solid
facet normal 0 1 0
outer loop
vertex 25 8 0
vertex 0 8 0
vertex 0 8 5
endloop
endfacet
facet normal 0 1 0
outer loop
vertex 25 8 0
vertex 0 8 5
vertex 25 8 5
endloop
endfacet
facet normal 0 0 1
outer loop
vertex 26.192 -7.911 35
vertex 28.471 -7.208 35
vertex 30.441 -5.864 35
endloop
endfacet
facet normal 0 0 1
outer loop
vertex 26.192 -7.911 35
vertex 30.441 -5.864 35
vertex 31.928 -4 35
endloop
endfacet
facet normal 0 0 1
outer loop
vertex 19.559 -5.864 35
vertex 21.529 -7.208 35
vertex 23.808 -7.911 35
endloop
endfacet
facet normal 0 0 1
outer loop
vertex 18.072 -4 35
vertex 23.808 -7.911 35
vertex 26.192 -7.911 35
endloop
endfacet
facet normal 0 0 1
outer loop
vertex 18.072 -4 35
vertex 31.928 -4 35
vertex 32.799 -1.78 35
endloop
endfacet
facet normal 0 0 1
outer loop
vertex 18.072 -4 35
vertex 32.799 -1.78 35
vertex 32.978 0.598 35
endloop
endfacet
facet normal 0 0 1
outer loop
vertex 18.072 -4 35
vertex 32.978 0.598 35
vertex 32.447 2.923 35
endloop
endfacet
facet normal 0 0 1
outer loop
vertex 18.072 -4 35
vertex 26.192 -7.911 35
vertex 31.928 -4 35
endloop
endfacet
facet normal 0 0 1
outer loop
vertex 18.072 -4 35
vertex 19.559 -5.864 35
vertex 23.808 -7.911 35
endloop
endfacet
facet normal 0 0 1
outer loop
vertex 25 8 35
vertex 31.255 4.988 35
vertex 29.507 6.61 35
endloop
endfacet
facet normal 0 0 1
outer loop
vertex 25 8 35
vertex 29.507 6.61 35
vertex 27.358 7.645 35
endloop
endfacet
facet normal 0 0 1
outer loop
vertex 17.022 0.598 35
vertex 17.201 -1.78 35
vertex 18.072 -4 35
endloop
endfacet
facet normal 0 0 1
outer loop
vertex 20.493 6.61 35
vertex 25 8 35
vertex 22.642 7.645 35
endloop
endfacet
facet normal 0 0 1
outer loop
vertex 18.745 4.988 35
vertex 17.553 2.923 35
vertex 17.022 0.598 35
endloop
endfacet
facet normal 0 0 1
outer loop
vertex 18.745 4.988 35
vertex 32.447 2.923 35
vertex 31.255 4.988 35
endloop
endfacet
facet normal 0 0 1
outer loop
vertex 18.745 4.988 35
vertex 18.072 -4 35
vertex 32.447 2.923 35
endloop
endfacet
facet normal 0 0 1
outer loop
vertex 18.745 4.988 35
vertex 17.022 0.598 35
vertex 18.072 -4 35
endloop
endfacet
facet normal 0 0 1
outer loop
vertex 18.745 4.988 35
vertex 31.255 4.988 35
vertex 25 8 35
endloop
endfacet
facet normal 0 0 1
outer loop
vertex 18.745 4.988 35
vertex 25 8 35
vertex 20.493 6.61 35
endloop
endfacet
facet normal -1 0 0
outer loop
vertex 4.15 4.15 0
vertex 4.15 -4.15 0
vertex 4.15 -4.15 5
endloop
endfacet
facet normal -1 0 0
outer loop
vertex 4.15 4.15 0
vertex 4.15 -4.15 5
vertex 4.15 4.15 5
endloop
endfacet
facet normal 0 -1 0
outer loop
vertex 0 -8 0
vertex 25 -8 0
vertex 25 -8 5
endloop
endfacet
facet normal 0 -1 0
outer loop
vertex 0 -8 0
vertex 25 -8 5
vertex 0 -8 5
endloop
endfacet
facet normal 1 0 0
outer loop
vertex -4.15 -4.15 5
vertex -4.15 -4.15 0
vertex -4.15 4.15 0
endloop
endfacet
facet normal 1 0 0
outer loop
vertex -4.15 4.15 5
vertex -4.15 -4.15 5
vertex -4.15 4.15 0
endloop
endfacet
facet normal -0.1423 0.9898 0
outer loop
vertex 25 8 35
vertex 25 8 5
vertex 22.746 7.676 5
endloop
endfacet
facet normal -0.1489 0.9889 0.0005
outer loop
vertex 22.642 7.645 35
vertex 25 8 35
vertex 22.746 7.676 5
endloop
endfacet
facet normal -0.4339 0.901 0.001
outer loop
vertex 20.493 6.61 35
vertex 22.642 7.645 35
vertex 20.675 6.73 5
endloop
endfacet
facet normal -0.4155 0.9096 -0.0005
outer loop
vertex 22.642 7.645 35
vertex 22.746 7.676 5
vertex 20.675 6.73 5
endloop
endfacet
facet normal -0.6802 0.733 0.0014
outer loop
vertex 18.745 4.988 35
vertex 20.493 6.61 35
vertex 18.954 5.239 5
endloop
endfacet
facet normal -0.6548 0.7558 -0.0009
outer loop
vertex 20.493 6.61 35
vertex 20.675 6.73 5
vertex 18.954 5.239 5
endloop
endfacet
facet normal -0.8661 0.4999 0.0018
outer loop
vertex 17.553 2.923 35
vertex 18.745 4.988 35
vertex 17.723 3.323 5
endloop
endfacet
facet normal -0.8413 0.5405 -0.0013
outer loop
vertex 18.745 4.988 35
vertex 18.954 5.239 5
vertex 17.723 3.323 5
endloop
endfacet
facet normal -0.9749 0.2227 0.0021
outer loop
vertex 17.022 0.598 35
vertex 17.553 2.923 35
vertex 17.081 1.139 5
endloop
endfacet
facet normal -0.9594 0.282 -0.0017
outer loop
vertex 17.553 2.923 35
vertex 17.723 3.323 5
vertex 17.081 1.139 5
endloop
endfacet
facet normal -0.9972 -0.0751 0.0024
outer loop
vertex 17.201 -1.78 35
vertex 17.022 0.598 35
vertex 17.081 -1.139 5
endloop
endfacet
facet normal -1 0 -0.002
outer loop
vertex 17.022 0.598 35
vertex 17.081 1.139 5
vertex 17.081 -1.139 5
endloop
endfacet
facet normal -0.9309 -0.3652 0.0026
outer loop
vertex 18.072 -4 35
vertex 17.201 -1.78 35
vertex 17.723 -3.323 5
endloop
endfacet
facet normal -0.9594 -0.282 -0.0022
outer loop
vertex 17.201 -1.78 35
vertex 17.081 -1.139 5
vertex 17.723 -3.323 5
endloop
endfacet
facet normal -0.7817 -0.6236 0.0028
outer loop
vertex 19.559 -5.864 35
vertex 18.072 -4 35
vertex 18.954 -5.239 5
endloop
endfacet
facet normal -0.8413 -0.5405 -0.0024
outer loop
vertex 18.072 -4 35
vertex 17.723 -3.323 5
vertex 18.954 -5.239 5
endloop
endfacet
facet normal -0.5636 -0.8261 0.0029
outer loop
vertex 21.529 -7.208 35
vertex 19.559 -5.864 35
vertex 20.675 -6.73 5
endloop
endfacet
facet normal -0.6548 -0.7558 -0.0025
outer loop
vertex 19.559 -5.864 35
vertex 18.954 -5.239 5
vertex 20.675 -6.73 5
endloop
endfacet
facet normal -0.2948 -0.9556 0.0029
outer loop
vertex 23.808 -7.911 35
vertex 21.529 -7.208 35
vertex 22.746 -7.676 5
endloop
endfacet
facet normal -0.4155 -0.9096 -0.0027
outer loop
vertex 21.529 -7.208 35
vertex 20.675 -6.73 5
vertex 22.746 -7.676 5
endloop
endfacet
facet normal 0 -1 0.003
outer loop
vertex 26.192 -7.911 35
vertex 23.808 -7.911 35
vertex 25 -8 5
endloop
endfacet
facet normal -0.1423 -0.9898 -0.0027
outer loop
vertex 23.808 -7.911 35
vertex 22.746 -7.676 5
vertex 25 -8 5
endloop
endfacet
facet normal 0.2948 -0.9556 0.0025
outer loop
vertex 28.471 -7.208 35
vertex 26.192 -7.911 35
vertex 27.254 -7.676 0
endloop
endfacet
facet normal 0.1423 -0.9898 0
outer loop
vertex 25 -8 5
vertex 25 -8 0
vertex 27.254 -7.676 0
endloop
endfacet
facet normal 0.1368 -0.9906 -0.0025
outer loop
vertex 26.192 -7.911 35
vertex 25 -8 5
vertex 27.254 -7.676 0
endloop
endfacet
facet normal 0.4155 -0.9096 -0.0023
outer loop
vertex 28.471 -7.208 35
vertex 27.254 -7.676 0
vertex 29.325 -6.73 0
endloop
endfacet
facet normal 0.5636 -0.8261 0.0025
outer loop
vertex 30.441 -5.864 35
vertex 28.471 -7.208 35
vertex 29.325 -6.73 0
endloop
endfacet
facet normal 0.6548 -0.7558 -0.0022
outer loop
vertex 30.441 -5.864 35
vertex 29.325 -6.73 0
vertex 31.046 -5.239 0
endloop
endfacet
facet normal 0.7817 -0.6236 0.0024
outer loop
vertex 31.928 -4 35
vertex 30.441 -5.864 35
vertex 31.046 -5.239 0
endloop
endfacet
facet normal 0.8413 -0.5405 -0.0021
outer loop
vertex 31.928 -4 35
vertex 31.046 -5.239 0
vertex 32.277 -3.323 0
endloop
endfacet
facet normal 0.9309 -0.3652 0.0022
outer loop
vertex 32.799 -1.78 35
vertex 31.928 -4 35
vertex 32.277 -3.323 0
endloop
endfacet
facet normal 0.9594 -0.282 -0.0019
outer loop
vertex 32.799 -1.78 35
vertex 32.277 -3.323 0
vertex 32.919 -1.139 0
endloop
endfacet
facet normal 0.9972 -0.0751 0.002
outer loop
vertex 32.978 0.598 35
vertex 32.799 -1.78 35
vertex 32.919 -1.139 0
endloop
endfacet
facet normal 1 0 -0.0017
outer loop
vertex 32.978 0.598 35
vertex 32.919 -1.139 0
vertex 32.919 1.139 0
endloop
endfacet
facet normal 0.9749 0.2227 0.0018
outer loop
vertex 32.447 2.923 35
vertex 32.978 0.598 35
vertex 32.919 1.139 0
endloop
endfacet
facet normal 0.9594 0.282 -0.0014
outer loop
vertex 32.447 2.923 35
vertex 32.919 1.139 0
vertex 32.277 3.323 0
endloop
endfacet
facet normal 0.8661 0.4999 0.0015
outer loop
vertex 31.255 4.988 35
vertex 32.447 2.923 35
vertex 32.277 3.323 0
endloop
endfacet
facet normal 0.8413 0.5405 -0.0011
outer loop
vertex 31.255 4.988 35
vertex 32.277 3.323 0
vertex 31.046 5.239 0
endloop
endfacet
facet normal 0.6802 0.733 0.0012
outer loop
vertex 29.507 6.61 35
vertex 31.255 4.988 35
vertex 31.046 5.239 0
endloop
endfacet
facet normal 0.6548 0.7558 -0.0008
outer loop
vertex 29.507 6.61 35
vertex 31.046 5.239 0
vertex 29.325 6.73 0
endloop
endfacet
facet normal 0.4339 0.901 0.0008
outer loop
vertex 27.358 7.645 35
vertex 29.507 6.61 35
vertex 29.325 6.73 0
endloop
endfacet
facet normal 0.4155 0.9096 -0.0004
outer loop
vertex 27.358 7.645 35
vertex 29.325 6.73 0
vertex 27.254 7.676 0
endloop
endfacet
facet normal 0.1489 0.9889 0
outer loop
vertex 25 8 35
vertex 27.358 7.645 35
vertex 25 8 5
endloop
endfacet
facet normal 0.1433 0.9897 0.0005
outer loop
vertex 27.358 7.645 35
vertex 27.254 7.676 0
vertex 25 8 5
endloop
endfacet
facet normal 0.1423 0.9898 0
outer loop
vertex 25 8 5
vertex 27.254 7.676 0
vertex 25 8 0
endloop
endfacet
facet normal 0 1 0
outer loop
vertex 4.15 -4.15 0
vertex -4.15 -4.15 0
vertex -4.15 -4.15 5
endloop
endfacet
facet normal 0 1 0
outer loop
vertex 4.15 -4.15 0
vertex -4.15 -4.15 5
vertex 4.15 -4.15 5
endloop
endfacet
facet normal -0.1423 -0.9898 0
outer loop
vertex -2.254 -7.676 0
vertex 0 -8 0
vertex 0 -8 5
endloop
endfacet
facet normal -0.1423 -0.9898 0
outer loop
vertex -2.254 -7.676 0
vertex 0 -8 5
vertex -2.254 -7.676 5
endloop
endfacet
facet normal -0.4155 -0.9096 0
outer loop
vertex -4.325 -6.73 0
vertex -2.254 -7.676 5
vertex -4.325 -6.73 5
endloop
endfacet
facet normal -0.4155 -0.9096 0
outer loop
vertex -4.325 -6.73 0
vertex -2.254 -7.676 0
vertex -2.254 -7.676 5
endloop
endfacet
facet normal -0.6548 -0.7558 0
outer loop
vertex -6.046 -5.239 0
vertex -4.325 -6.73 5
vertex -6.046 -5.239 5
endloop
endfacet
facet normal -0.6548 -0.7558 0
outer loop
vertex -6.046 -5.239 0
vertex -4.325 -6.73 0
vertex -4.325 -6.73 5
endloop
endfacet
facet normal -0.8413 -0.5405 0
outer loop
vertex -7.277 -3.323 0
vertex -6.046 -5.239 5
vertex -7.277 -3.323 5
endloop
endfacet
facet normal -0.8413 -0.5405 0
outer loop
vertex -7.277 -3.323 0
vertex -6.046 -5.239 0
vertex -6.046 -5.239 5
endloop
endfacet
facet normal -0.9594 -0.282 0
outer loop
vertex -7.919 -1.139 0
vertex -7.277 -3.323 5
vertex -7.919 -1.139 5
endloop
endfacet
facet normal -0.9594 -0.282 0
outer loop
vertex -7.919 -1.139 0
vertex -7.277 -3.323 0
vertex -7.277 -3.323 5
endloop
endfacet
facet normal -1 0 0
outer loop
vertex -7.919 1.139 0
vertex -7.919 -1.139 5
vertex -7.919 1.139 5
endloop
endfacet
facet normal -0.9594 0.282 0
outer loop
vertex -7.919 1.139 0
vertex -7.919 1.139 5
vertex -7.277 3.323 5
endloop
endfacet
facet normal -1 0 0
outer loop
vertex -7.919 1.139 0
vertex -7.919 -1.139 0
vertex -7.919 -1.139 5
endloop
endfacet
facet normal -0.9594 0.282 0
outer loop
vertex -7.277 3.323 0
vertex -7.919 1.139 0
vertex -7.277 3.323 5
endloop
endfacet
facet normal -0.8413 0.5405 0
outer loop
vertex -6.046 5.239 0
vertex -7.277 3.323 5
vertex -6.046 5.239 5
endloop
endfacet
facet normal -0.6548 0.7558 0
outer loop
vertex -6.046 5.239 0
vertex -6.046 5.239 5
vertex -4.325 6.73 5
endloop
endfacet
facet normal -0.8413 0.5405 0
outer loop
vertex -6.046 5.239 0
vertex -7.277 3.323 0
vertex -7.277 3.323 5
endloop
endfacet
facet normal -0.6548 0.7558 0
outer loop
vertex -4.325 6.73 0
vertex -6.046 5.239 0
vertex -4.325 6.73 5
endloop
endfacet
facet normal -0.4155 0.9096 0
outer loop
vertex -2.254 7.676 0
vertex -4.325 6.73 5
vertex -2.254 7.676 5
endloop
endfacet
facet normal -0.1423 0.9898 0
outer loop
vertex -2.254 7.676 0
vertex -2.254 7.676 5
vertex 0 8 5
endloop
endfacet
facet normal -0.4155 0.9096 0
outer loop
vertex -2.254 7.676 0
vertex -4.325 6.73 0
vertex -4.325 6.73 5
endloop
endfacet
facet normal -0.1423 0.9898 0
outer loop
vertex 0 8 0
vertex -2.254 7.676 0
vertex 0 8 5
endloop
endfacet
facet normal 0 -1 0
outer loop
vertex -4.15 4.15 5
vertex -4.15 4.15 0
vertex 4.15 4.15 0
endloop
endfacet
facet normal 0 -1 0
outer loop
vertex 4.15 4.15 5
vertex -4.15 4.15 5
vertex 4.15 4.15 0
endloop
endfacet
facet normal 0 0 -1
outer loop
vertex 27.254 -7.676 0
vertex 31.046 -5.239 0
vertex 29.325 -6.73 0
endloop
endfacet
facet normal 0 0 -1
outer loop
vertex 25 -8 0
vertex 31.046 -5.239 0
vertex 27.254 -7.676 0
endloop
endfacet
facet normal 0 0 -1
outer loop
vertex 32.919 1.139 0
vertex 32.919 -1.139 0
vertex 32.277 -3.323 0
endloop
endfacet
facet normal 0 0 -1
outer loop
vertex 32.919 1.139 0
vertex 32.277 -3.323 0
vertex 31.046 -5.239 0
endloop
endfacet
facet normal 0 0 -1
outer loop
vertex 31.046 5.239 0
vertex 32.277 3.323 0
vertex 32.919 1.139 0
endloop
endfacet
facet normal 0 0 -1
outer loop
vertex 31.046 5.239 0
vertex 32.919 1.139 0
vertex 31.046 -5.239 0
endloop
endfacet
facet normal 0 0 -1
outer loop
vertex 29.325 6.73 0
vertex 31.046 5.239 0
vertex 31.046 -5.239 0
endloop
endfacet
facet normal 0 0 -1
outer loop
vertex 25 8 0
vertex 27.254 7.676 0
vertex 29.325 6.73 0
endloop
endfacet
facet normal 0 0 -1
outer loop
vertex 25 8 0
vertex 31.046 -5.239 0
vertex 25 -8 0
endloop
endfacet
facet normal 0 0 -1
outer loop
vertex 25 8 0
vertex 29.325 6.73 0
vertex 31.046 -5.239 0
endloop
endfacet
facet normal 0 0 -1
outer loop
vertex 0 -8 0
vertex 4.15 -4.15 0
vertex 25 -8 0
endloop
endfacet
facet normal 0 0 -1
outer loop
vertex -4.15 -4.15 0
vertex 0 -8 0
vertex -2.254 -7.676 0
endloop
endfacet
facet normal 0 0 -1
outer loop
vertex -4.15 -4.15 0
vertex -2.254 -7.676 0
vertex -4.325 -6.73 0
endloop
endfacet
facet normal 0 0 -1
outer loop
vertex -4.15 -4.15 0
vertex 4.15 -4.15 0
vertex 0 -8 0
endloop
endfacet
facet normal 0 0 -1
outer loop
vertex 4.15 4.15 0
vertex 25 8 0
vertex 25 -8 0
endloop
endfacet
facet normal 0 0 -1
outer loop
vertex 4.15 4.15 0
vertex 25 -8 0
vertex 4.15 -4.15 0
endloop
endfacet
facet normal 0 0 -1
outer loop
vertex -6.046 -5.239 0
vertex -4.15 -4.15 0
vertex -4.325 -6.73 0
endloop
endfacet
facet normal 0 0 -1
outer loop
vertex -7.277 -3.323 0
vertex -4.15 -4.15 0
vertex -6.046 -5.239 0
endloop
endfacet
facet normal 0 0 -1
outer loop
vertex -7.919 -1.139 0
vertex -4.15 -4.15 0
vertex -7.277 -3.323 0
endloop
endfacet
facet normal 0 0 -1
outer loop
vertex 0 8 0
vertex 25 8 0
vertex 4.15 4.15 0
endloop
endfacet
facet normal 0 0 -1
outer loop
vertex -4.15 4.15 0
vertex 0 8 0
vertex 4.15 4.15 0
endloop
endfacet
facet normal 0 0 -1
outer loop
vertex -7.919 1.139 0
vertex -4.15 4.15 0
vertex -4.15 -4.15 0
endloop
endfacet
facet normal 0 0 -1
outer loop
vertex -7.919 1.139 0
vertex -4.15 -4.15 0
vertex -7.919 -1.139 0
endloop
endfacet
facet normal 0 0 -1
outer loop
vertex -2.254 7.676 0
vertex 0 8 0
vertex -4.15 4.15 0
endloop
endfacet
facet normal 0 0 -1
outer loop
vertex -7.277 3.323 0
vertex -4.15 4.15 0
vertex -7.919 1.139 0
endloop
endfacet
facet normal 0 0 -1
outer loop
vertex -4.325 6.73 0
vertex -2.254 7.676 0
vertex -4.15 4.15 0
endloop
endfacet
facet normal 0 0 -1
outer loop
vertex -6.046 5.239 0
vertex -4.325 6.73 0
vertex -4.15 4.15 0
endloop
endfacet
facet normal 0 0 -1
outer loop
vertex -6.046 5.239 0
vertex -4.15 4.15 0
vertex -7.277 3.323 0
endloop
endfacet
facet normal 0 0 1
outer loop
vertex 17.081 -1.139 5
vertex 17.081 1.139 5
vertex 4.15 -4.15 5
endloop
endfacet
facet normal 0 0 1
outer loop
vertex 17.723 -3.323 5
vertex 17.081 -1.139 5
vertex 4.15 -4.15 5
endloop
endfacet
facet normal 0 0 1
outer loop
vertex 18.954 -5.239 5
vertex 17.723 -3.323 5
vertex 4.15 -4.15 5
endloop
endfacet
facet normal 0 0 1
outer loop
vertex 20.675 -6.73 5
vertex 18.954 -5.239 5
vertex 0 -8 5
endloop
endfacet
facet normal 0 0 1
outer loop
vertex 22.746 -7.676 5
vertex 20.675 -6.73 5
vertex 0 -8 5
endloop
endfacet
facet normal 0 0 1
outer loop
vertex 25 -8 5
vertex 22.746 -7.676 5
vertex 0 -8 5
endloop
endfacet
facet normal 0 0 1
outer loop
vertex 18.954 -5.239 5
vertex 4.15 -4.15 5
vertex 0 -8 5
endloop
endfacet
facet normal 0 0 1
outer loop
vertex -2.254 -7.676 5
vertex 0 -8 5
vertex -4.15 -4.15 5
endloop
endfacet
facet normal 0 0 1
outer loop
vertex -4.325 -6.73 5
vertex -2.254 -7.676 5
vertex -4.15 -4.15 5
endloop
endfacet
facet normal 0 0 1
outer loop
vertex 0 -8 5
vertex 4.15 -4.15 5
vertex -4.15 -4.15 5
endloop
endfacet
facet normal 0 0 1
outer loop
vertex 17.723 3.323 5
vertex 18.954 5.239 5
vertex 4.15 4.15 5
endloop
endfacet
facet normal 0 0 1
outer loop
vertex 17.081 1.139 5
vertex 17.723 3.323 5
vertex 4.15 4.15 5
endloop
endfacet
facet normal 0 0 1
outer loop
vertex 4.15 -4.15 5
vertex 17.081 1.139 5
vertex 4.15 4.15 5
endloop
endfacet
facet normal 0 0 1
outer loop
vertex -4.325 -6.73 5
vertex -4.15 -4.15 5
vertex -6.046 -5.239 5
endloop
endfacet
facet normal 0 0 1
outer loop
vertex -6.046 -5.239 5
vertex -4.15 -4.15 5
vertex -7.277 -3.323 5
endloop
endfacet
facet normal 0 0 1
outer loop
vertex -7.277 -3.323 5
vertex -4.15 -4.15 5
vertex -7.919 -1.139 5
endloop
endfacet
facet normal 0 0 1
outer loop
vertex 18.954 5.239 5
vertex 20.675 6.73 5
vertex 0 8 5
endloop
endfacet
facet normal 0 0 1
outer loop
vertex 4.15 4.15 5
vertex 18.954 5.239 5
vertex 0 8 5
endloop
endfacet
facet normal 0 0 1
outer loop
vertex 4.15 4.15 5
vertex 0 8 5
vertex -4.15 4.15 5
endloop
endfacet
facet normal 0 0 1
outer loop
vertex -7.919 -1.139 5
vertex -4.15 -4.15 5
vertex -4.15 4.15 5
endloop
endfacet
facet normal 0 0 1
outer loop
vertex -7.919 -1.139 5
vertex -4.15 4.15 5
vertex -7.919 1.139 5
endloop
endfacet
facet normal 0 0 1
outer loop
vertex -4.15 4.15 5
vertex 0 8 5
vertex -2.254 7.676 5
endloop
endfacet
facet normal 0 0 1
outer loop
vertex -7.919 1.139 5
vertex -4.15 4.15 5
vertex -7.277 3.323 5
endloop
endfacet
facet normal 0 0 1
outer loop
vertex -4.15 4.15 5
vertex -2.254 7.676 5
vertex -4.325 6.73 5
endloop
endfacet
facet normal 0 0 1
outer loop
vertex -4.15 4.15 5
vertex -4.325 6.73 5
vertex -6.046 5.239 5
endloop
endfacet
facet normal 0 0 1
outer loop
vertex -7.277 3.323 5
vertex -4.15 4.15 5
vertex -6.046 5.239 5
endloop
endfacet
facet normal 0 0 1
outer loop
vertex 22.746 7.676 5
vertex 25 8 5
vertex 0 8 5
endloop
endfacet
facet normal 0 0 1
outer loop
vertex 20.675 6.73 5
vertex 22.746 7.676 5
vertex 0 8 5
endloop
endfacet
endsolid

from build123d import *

# Parameters (mm, degrees)
SKETCH1_W           = 8.3
SKETCH1_H           = 8.3
BOSS_EXTRUDE1_DEPTH = 5
SKETCH2_R           = 8
BOSS_EXTRUDE2_DEPTH = 30


with BuildPart() as part:
    # Sketch1 → Boss-Extrude1 (new body)
    with BuildSketch(Plane.XY):
        with BuildLine():
            Line((0, 8), (25, 8))
            ThreePointArc((25, 8), (33, 0), (25, -8))
            Line((25, -8), (0, -8))
            ThreePointArc((0, -8), (-8, 0), (0, 8))
        make_face()
        Rectangle(SKETCH1_W, SKETCH1_H, mode=Mode.SUBTRACT)
    extrude(amount=BOSS_EXTRUDE1_DEPTH)

    # Sketch2 → Boss-Extrude2 (add)
    with BuildSketch(Plane.XY.offset(5)):
        with Locations(Location((25, 0, 0), (0, 0, 90))):
            Circle(SKETCH2_R)
    extrude(amount=BOSS_EXTRUDE2_DEPTH)


solid = part.part
